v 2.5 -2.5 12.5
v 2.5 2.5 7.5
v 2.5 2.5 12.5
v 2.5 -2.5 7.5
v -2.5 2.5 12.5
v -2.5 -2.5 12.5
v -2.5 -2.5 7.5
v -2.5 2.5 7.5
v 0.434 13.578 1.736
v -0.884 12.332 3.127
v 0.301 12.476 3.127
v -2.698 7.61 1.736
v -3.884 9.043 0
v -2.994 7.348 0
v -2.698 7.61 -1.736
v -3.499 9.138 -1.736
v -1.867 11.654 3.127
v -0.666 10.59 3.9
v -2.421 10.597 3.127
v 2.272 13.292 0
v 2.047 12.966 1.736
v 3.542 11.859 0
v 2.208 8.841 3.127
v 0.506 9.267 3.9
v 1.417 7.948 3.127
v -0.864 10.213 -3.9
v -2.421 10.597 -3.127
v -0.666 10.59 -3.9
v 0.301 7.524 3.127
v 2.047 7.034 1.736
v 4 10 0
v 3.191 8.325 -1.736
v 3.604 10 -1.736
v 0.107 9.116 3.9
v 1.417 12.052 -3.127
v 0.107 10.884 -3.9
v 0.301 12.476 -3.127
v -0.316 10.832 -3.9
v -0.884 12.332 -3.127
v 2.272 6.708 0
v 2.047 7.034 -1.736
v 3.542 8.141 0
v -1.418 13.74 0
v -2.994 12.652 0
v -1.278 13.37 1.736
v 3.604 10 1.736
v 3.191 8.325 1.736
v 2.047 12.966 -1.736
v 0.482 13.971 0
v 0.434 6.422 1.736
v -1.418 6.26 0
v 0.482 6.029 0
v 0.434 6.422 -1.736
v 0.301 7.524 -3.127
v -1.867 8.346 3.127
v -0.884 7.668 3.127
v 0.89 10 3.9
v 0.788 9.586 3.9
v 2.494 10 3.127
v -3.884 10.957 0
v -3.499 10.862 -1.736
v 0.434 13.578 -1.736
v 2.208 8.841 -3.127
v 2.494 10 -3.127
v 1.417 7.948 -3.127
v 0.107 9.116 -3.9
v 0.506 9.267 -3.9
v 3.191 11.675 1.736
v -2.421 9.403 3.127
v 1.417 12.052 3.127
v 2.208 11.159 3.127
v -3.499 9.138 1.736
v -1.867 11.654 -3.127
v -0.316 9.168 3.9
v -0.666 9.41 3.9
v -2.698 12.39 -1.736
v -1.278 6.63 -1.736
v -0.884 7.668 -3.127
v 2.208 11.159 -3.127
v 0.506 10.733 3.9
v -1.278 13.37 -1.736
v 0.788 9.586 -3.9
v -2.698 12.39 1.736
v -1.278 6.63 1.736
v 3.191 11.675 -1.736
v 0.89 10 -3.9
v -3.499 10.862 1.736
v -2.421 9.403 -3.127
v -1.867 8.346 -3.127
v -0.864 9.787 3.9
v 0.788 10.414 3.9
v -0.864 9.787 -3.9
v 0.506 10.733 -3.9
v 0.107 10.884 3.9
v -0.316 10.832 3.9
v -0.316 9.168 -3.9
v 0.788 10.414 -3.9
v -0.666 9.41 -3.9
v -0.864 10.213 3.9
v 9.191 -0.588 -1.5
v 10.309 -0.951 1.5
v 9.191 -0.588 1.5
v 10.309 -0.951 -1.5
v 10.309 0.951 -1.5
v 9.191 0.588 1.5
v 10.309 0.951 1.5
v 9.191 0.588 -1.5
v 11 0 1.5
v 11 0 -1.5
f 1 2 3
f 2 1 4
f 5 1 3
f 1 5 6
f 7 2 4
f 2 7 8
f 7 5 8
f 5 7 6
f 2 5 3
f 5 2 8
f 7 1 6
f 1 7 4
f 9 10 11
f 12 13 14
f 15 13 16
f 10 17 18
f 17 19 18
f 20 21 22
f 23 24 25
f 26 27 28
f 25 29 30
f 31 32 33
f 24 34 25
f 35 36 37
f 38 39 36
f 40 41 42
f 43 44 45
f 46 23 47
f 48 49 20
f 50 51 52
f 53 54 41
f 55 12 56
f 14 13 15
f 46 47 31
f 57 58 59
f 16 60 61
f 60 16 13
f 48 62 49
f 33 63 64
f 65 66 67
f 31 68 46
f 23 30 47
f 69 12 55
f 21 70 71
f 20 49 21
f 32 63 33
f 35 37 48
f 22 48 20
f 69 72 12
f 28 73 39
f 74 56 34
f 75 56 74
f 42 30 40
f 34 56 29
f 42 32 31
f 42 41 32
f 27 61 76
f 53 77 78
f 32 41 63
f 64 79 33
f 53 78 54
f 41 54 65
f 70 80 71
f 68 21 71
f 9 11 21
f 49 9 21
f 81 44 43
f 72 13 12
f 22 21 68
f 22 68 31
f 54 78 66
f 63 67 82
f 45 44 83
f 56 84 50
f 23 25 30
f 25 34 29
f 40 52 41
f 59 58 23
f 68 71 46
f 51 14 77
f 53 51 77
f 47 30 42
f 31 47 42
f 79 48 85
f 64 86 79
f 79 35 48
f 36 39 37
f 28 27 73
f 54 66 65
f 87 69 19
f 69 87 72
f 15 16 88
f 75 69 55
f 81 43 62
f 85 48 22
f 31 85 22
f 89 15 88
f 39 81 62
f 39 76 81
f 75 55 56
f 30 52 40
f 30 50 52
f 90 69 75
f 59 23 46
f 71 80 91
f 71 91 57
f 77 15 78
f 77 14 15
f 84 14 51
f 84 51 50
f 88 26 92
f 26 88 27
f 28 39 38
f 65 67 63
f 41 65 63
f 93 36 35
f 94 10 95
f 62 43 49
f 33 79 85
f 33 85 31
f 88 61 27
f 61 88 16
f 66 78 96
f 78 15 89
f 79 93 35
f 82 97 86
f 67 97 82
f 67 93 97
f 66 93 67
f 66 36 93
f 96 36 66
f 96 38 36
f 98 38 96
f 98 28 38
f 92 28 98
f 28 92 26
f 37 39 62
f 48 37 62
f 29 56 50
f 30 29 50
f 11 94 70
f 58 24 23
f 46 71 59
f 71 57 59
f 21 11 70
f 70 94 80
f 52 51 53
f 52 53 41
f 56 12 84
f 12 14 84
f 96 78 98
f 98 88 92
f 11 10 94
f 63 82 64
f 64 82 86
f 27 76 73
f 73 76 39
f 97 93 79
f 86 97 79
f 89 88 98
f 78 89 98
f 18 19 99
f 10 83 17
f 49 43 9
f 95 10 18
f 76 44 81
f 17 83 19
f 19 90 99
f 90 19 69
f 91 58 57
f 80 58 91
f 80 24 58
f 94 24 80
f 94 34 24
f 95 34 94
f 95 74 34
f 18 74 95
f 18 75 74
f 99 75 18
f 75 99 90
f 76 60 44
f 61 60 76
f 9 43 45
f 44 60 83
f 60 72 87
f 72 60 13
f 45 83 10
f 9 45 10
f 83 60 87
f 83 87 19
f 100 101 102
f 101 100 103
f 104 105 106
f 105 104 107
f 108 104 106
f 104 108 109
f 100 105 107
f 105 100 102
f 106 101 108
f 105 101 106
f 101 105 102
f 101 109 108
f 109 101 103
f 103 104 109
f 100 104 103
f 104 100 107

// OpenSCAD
translate([0,0,10]) cube(5, center=true);
translate([0,10, 0]) sphere(4, center=true);
translate([10,0,0]) cylinder(3, center=true);
